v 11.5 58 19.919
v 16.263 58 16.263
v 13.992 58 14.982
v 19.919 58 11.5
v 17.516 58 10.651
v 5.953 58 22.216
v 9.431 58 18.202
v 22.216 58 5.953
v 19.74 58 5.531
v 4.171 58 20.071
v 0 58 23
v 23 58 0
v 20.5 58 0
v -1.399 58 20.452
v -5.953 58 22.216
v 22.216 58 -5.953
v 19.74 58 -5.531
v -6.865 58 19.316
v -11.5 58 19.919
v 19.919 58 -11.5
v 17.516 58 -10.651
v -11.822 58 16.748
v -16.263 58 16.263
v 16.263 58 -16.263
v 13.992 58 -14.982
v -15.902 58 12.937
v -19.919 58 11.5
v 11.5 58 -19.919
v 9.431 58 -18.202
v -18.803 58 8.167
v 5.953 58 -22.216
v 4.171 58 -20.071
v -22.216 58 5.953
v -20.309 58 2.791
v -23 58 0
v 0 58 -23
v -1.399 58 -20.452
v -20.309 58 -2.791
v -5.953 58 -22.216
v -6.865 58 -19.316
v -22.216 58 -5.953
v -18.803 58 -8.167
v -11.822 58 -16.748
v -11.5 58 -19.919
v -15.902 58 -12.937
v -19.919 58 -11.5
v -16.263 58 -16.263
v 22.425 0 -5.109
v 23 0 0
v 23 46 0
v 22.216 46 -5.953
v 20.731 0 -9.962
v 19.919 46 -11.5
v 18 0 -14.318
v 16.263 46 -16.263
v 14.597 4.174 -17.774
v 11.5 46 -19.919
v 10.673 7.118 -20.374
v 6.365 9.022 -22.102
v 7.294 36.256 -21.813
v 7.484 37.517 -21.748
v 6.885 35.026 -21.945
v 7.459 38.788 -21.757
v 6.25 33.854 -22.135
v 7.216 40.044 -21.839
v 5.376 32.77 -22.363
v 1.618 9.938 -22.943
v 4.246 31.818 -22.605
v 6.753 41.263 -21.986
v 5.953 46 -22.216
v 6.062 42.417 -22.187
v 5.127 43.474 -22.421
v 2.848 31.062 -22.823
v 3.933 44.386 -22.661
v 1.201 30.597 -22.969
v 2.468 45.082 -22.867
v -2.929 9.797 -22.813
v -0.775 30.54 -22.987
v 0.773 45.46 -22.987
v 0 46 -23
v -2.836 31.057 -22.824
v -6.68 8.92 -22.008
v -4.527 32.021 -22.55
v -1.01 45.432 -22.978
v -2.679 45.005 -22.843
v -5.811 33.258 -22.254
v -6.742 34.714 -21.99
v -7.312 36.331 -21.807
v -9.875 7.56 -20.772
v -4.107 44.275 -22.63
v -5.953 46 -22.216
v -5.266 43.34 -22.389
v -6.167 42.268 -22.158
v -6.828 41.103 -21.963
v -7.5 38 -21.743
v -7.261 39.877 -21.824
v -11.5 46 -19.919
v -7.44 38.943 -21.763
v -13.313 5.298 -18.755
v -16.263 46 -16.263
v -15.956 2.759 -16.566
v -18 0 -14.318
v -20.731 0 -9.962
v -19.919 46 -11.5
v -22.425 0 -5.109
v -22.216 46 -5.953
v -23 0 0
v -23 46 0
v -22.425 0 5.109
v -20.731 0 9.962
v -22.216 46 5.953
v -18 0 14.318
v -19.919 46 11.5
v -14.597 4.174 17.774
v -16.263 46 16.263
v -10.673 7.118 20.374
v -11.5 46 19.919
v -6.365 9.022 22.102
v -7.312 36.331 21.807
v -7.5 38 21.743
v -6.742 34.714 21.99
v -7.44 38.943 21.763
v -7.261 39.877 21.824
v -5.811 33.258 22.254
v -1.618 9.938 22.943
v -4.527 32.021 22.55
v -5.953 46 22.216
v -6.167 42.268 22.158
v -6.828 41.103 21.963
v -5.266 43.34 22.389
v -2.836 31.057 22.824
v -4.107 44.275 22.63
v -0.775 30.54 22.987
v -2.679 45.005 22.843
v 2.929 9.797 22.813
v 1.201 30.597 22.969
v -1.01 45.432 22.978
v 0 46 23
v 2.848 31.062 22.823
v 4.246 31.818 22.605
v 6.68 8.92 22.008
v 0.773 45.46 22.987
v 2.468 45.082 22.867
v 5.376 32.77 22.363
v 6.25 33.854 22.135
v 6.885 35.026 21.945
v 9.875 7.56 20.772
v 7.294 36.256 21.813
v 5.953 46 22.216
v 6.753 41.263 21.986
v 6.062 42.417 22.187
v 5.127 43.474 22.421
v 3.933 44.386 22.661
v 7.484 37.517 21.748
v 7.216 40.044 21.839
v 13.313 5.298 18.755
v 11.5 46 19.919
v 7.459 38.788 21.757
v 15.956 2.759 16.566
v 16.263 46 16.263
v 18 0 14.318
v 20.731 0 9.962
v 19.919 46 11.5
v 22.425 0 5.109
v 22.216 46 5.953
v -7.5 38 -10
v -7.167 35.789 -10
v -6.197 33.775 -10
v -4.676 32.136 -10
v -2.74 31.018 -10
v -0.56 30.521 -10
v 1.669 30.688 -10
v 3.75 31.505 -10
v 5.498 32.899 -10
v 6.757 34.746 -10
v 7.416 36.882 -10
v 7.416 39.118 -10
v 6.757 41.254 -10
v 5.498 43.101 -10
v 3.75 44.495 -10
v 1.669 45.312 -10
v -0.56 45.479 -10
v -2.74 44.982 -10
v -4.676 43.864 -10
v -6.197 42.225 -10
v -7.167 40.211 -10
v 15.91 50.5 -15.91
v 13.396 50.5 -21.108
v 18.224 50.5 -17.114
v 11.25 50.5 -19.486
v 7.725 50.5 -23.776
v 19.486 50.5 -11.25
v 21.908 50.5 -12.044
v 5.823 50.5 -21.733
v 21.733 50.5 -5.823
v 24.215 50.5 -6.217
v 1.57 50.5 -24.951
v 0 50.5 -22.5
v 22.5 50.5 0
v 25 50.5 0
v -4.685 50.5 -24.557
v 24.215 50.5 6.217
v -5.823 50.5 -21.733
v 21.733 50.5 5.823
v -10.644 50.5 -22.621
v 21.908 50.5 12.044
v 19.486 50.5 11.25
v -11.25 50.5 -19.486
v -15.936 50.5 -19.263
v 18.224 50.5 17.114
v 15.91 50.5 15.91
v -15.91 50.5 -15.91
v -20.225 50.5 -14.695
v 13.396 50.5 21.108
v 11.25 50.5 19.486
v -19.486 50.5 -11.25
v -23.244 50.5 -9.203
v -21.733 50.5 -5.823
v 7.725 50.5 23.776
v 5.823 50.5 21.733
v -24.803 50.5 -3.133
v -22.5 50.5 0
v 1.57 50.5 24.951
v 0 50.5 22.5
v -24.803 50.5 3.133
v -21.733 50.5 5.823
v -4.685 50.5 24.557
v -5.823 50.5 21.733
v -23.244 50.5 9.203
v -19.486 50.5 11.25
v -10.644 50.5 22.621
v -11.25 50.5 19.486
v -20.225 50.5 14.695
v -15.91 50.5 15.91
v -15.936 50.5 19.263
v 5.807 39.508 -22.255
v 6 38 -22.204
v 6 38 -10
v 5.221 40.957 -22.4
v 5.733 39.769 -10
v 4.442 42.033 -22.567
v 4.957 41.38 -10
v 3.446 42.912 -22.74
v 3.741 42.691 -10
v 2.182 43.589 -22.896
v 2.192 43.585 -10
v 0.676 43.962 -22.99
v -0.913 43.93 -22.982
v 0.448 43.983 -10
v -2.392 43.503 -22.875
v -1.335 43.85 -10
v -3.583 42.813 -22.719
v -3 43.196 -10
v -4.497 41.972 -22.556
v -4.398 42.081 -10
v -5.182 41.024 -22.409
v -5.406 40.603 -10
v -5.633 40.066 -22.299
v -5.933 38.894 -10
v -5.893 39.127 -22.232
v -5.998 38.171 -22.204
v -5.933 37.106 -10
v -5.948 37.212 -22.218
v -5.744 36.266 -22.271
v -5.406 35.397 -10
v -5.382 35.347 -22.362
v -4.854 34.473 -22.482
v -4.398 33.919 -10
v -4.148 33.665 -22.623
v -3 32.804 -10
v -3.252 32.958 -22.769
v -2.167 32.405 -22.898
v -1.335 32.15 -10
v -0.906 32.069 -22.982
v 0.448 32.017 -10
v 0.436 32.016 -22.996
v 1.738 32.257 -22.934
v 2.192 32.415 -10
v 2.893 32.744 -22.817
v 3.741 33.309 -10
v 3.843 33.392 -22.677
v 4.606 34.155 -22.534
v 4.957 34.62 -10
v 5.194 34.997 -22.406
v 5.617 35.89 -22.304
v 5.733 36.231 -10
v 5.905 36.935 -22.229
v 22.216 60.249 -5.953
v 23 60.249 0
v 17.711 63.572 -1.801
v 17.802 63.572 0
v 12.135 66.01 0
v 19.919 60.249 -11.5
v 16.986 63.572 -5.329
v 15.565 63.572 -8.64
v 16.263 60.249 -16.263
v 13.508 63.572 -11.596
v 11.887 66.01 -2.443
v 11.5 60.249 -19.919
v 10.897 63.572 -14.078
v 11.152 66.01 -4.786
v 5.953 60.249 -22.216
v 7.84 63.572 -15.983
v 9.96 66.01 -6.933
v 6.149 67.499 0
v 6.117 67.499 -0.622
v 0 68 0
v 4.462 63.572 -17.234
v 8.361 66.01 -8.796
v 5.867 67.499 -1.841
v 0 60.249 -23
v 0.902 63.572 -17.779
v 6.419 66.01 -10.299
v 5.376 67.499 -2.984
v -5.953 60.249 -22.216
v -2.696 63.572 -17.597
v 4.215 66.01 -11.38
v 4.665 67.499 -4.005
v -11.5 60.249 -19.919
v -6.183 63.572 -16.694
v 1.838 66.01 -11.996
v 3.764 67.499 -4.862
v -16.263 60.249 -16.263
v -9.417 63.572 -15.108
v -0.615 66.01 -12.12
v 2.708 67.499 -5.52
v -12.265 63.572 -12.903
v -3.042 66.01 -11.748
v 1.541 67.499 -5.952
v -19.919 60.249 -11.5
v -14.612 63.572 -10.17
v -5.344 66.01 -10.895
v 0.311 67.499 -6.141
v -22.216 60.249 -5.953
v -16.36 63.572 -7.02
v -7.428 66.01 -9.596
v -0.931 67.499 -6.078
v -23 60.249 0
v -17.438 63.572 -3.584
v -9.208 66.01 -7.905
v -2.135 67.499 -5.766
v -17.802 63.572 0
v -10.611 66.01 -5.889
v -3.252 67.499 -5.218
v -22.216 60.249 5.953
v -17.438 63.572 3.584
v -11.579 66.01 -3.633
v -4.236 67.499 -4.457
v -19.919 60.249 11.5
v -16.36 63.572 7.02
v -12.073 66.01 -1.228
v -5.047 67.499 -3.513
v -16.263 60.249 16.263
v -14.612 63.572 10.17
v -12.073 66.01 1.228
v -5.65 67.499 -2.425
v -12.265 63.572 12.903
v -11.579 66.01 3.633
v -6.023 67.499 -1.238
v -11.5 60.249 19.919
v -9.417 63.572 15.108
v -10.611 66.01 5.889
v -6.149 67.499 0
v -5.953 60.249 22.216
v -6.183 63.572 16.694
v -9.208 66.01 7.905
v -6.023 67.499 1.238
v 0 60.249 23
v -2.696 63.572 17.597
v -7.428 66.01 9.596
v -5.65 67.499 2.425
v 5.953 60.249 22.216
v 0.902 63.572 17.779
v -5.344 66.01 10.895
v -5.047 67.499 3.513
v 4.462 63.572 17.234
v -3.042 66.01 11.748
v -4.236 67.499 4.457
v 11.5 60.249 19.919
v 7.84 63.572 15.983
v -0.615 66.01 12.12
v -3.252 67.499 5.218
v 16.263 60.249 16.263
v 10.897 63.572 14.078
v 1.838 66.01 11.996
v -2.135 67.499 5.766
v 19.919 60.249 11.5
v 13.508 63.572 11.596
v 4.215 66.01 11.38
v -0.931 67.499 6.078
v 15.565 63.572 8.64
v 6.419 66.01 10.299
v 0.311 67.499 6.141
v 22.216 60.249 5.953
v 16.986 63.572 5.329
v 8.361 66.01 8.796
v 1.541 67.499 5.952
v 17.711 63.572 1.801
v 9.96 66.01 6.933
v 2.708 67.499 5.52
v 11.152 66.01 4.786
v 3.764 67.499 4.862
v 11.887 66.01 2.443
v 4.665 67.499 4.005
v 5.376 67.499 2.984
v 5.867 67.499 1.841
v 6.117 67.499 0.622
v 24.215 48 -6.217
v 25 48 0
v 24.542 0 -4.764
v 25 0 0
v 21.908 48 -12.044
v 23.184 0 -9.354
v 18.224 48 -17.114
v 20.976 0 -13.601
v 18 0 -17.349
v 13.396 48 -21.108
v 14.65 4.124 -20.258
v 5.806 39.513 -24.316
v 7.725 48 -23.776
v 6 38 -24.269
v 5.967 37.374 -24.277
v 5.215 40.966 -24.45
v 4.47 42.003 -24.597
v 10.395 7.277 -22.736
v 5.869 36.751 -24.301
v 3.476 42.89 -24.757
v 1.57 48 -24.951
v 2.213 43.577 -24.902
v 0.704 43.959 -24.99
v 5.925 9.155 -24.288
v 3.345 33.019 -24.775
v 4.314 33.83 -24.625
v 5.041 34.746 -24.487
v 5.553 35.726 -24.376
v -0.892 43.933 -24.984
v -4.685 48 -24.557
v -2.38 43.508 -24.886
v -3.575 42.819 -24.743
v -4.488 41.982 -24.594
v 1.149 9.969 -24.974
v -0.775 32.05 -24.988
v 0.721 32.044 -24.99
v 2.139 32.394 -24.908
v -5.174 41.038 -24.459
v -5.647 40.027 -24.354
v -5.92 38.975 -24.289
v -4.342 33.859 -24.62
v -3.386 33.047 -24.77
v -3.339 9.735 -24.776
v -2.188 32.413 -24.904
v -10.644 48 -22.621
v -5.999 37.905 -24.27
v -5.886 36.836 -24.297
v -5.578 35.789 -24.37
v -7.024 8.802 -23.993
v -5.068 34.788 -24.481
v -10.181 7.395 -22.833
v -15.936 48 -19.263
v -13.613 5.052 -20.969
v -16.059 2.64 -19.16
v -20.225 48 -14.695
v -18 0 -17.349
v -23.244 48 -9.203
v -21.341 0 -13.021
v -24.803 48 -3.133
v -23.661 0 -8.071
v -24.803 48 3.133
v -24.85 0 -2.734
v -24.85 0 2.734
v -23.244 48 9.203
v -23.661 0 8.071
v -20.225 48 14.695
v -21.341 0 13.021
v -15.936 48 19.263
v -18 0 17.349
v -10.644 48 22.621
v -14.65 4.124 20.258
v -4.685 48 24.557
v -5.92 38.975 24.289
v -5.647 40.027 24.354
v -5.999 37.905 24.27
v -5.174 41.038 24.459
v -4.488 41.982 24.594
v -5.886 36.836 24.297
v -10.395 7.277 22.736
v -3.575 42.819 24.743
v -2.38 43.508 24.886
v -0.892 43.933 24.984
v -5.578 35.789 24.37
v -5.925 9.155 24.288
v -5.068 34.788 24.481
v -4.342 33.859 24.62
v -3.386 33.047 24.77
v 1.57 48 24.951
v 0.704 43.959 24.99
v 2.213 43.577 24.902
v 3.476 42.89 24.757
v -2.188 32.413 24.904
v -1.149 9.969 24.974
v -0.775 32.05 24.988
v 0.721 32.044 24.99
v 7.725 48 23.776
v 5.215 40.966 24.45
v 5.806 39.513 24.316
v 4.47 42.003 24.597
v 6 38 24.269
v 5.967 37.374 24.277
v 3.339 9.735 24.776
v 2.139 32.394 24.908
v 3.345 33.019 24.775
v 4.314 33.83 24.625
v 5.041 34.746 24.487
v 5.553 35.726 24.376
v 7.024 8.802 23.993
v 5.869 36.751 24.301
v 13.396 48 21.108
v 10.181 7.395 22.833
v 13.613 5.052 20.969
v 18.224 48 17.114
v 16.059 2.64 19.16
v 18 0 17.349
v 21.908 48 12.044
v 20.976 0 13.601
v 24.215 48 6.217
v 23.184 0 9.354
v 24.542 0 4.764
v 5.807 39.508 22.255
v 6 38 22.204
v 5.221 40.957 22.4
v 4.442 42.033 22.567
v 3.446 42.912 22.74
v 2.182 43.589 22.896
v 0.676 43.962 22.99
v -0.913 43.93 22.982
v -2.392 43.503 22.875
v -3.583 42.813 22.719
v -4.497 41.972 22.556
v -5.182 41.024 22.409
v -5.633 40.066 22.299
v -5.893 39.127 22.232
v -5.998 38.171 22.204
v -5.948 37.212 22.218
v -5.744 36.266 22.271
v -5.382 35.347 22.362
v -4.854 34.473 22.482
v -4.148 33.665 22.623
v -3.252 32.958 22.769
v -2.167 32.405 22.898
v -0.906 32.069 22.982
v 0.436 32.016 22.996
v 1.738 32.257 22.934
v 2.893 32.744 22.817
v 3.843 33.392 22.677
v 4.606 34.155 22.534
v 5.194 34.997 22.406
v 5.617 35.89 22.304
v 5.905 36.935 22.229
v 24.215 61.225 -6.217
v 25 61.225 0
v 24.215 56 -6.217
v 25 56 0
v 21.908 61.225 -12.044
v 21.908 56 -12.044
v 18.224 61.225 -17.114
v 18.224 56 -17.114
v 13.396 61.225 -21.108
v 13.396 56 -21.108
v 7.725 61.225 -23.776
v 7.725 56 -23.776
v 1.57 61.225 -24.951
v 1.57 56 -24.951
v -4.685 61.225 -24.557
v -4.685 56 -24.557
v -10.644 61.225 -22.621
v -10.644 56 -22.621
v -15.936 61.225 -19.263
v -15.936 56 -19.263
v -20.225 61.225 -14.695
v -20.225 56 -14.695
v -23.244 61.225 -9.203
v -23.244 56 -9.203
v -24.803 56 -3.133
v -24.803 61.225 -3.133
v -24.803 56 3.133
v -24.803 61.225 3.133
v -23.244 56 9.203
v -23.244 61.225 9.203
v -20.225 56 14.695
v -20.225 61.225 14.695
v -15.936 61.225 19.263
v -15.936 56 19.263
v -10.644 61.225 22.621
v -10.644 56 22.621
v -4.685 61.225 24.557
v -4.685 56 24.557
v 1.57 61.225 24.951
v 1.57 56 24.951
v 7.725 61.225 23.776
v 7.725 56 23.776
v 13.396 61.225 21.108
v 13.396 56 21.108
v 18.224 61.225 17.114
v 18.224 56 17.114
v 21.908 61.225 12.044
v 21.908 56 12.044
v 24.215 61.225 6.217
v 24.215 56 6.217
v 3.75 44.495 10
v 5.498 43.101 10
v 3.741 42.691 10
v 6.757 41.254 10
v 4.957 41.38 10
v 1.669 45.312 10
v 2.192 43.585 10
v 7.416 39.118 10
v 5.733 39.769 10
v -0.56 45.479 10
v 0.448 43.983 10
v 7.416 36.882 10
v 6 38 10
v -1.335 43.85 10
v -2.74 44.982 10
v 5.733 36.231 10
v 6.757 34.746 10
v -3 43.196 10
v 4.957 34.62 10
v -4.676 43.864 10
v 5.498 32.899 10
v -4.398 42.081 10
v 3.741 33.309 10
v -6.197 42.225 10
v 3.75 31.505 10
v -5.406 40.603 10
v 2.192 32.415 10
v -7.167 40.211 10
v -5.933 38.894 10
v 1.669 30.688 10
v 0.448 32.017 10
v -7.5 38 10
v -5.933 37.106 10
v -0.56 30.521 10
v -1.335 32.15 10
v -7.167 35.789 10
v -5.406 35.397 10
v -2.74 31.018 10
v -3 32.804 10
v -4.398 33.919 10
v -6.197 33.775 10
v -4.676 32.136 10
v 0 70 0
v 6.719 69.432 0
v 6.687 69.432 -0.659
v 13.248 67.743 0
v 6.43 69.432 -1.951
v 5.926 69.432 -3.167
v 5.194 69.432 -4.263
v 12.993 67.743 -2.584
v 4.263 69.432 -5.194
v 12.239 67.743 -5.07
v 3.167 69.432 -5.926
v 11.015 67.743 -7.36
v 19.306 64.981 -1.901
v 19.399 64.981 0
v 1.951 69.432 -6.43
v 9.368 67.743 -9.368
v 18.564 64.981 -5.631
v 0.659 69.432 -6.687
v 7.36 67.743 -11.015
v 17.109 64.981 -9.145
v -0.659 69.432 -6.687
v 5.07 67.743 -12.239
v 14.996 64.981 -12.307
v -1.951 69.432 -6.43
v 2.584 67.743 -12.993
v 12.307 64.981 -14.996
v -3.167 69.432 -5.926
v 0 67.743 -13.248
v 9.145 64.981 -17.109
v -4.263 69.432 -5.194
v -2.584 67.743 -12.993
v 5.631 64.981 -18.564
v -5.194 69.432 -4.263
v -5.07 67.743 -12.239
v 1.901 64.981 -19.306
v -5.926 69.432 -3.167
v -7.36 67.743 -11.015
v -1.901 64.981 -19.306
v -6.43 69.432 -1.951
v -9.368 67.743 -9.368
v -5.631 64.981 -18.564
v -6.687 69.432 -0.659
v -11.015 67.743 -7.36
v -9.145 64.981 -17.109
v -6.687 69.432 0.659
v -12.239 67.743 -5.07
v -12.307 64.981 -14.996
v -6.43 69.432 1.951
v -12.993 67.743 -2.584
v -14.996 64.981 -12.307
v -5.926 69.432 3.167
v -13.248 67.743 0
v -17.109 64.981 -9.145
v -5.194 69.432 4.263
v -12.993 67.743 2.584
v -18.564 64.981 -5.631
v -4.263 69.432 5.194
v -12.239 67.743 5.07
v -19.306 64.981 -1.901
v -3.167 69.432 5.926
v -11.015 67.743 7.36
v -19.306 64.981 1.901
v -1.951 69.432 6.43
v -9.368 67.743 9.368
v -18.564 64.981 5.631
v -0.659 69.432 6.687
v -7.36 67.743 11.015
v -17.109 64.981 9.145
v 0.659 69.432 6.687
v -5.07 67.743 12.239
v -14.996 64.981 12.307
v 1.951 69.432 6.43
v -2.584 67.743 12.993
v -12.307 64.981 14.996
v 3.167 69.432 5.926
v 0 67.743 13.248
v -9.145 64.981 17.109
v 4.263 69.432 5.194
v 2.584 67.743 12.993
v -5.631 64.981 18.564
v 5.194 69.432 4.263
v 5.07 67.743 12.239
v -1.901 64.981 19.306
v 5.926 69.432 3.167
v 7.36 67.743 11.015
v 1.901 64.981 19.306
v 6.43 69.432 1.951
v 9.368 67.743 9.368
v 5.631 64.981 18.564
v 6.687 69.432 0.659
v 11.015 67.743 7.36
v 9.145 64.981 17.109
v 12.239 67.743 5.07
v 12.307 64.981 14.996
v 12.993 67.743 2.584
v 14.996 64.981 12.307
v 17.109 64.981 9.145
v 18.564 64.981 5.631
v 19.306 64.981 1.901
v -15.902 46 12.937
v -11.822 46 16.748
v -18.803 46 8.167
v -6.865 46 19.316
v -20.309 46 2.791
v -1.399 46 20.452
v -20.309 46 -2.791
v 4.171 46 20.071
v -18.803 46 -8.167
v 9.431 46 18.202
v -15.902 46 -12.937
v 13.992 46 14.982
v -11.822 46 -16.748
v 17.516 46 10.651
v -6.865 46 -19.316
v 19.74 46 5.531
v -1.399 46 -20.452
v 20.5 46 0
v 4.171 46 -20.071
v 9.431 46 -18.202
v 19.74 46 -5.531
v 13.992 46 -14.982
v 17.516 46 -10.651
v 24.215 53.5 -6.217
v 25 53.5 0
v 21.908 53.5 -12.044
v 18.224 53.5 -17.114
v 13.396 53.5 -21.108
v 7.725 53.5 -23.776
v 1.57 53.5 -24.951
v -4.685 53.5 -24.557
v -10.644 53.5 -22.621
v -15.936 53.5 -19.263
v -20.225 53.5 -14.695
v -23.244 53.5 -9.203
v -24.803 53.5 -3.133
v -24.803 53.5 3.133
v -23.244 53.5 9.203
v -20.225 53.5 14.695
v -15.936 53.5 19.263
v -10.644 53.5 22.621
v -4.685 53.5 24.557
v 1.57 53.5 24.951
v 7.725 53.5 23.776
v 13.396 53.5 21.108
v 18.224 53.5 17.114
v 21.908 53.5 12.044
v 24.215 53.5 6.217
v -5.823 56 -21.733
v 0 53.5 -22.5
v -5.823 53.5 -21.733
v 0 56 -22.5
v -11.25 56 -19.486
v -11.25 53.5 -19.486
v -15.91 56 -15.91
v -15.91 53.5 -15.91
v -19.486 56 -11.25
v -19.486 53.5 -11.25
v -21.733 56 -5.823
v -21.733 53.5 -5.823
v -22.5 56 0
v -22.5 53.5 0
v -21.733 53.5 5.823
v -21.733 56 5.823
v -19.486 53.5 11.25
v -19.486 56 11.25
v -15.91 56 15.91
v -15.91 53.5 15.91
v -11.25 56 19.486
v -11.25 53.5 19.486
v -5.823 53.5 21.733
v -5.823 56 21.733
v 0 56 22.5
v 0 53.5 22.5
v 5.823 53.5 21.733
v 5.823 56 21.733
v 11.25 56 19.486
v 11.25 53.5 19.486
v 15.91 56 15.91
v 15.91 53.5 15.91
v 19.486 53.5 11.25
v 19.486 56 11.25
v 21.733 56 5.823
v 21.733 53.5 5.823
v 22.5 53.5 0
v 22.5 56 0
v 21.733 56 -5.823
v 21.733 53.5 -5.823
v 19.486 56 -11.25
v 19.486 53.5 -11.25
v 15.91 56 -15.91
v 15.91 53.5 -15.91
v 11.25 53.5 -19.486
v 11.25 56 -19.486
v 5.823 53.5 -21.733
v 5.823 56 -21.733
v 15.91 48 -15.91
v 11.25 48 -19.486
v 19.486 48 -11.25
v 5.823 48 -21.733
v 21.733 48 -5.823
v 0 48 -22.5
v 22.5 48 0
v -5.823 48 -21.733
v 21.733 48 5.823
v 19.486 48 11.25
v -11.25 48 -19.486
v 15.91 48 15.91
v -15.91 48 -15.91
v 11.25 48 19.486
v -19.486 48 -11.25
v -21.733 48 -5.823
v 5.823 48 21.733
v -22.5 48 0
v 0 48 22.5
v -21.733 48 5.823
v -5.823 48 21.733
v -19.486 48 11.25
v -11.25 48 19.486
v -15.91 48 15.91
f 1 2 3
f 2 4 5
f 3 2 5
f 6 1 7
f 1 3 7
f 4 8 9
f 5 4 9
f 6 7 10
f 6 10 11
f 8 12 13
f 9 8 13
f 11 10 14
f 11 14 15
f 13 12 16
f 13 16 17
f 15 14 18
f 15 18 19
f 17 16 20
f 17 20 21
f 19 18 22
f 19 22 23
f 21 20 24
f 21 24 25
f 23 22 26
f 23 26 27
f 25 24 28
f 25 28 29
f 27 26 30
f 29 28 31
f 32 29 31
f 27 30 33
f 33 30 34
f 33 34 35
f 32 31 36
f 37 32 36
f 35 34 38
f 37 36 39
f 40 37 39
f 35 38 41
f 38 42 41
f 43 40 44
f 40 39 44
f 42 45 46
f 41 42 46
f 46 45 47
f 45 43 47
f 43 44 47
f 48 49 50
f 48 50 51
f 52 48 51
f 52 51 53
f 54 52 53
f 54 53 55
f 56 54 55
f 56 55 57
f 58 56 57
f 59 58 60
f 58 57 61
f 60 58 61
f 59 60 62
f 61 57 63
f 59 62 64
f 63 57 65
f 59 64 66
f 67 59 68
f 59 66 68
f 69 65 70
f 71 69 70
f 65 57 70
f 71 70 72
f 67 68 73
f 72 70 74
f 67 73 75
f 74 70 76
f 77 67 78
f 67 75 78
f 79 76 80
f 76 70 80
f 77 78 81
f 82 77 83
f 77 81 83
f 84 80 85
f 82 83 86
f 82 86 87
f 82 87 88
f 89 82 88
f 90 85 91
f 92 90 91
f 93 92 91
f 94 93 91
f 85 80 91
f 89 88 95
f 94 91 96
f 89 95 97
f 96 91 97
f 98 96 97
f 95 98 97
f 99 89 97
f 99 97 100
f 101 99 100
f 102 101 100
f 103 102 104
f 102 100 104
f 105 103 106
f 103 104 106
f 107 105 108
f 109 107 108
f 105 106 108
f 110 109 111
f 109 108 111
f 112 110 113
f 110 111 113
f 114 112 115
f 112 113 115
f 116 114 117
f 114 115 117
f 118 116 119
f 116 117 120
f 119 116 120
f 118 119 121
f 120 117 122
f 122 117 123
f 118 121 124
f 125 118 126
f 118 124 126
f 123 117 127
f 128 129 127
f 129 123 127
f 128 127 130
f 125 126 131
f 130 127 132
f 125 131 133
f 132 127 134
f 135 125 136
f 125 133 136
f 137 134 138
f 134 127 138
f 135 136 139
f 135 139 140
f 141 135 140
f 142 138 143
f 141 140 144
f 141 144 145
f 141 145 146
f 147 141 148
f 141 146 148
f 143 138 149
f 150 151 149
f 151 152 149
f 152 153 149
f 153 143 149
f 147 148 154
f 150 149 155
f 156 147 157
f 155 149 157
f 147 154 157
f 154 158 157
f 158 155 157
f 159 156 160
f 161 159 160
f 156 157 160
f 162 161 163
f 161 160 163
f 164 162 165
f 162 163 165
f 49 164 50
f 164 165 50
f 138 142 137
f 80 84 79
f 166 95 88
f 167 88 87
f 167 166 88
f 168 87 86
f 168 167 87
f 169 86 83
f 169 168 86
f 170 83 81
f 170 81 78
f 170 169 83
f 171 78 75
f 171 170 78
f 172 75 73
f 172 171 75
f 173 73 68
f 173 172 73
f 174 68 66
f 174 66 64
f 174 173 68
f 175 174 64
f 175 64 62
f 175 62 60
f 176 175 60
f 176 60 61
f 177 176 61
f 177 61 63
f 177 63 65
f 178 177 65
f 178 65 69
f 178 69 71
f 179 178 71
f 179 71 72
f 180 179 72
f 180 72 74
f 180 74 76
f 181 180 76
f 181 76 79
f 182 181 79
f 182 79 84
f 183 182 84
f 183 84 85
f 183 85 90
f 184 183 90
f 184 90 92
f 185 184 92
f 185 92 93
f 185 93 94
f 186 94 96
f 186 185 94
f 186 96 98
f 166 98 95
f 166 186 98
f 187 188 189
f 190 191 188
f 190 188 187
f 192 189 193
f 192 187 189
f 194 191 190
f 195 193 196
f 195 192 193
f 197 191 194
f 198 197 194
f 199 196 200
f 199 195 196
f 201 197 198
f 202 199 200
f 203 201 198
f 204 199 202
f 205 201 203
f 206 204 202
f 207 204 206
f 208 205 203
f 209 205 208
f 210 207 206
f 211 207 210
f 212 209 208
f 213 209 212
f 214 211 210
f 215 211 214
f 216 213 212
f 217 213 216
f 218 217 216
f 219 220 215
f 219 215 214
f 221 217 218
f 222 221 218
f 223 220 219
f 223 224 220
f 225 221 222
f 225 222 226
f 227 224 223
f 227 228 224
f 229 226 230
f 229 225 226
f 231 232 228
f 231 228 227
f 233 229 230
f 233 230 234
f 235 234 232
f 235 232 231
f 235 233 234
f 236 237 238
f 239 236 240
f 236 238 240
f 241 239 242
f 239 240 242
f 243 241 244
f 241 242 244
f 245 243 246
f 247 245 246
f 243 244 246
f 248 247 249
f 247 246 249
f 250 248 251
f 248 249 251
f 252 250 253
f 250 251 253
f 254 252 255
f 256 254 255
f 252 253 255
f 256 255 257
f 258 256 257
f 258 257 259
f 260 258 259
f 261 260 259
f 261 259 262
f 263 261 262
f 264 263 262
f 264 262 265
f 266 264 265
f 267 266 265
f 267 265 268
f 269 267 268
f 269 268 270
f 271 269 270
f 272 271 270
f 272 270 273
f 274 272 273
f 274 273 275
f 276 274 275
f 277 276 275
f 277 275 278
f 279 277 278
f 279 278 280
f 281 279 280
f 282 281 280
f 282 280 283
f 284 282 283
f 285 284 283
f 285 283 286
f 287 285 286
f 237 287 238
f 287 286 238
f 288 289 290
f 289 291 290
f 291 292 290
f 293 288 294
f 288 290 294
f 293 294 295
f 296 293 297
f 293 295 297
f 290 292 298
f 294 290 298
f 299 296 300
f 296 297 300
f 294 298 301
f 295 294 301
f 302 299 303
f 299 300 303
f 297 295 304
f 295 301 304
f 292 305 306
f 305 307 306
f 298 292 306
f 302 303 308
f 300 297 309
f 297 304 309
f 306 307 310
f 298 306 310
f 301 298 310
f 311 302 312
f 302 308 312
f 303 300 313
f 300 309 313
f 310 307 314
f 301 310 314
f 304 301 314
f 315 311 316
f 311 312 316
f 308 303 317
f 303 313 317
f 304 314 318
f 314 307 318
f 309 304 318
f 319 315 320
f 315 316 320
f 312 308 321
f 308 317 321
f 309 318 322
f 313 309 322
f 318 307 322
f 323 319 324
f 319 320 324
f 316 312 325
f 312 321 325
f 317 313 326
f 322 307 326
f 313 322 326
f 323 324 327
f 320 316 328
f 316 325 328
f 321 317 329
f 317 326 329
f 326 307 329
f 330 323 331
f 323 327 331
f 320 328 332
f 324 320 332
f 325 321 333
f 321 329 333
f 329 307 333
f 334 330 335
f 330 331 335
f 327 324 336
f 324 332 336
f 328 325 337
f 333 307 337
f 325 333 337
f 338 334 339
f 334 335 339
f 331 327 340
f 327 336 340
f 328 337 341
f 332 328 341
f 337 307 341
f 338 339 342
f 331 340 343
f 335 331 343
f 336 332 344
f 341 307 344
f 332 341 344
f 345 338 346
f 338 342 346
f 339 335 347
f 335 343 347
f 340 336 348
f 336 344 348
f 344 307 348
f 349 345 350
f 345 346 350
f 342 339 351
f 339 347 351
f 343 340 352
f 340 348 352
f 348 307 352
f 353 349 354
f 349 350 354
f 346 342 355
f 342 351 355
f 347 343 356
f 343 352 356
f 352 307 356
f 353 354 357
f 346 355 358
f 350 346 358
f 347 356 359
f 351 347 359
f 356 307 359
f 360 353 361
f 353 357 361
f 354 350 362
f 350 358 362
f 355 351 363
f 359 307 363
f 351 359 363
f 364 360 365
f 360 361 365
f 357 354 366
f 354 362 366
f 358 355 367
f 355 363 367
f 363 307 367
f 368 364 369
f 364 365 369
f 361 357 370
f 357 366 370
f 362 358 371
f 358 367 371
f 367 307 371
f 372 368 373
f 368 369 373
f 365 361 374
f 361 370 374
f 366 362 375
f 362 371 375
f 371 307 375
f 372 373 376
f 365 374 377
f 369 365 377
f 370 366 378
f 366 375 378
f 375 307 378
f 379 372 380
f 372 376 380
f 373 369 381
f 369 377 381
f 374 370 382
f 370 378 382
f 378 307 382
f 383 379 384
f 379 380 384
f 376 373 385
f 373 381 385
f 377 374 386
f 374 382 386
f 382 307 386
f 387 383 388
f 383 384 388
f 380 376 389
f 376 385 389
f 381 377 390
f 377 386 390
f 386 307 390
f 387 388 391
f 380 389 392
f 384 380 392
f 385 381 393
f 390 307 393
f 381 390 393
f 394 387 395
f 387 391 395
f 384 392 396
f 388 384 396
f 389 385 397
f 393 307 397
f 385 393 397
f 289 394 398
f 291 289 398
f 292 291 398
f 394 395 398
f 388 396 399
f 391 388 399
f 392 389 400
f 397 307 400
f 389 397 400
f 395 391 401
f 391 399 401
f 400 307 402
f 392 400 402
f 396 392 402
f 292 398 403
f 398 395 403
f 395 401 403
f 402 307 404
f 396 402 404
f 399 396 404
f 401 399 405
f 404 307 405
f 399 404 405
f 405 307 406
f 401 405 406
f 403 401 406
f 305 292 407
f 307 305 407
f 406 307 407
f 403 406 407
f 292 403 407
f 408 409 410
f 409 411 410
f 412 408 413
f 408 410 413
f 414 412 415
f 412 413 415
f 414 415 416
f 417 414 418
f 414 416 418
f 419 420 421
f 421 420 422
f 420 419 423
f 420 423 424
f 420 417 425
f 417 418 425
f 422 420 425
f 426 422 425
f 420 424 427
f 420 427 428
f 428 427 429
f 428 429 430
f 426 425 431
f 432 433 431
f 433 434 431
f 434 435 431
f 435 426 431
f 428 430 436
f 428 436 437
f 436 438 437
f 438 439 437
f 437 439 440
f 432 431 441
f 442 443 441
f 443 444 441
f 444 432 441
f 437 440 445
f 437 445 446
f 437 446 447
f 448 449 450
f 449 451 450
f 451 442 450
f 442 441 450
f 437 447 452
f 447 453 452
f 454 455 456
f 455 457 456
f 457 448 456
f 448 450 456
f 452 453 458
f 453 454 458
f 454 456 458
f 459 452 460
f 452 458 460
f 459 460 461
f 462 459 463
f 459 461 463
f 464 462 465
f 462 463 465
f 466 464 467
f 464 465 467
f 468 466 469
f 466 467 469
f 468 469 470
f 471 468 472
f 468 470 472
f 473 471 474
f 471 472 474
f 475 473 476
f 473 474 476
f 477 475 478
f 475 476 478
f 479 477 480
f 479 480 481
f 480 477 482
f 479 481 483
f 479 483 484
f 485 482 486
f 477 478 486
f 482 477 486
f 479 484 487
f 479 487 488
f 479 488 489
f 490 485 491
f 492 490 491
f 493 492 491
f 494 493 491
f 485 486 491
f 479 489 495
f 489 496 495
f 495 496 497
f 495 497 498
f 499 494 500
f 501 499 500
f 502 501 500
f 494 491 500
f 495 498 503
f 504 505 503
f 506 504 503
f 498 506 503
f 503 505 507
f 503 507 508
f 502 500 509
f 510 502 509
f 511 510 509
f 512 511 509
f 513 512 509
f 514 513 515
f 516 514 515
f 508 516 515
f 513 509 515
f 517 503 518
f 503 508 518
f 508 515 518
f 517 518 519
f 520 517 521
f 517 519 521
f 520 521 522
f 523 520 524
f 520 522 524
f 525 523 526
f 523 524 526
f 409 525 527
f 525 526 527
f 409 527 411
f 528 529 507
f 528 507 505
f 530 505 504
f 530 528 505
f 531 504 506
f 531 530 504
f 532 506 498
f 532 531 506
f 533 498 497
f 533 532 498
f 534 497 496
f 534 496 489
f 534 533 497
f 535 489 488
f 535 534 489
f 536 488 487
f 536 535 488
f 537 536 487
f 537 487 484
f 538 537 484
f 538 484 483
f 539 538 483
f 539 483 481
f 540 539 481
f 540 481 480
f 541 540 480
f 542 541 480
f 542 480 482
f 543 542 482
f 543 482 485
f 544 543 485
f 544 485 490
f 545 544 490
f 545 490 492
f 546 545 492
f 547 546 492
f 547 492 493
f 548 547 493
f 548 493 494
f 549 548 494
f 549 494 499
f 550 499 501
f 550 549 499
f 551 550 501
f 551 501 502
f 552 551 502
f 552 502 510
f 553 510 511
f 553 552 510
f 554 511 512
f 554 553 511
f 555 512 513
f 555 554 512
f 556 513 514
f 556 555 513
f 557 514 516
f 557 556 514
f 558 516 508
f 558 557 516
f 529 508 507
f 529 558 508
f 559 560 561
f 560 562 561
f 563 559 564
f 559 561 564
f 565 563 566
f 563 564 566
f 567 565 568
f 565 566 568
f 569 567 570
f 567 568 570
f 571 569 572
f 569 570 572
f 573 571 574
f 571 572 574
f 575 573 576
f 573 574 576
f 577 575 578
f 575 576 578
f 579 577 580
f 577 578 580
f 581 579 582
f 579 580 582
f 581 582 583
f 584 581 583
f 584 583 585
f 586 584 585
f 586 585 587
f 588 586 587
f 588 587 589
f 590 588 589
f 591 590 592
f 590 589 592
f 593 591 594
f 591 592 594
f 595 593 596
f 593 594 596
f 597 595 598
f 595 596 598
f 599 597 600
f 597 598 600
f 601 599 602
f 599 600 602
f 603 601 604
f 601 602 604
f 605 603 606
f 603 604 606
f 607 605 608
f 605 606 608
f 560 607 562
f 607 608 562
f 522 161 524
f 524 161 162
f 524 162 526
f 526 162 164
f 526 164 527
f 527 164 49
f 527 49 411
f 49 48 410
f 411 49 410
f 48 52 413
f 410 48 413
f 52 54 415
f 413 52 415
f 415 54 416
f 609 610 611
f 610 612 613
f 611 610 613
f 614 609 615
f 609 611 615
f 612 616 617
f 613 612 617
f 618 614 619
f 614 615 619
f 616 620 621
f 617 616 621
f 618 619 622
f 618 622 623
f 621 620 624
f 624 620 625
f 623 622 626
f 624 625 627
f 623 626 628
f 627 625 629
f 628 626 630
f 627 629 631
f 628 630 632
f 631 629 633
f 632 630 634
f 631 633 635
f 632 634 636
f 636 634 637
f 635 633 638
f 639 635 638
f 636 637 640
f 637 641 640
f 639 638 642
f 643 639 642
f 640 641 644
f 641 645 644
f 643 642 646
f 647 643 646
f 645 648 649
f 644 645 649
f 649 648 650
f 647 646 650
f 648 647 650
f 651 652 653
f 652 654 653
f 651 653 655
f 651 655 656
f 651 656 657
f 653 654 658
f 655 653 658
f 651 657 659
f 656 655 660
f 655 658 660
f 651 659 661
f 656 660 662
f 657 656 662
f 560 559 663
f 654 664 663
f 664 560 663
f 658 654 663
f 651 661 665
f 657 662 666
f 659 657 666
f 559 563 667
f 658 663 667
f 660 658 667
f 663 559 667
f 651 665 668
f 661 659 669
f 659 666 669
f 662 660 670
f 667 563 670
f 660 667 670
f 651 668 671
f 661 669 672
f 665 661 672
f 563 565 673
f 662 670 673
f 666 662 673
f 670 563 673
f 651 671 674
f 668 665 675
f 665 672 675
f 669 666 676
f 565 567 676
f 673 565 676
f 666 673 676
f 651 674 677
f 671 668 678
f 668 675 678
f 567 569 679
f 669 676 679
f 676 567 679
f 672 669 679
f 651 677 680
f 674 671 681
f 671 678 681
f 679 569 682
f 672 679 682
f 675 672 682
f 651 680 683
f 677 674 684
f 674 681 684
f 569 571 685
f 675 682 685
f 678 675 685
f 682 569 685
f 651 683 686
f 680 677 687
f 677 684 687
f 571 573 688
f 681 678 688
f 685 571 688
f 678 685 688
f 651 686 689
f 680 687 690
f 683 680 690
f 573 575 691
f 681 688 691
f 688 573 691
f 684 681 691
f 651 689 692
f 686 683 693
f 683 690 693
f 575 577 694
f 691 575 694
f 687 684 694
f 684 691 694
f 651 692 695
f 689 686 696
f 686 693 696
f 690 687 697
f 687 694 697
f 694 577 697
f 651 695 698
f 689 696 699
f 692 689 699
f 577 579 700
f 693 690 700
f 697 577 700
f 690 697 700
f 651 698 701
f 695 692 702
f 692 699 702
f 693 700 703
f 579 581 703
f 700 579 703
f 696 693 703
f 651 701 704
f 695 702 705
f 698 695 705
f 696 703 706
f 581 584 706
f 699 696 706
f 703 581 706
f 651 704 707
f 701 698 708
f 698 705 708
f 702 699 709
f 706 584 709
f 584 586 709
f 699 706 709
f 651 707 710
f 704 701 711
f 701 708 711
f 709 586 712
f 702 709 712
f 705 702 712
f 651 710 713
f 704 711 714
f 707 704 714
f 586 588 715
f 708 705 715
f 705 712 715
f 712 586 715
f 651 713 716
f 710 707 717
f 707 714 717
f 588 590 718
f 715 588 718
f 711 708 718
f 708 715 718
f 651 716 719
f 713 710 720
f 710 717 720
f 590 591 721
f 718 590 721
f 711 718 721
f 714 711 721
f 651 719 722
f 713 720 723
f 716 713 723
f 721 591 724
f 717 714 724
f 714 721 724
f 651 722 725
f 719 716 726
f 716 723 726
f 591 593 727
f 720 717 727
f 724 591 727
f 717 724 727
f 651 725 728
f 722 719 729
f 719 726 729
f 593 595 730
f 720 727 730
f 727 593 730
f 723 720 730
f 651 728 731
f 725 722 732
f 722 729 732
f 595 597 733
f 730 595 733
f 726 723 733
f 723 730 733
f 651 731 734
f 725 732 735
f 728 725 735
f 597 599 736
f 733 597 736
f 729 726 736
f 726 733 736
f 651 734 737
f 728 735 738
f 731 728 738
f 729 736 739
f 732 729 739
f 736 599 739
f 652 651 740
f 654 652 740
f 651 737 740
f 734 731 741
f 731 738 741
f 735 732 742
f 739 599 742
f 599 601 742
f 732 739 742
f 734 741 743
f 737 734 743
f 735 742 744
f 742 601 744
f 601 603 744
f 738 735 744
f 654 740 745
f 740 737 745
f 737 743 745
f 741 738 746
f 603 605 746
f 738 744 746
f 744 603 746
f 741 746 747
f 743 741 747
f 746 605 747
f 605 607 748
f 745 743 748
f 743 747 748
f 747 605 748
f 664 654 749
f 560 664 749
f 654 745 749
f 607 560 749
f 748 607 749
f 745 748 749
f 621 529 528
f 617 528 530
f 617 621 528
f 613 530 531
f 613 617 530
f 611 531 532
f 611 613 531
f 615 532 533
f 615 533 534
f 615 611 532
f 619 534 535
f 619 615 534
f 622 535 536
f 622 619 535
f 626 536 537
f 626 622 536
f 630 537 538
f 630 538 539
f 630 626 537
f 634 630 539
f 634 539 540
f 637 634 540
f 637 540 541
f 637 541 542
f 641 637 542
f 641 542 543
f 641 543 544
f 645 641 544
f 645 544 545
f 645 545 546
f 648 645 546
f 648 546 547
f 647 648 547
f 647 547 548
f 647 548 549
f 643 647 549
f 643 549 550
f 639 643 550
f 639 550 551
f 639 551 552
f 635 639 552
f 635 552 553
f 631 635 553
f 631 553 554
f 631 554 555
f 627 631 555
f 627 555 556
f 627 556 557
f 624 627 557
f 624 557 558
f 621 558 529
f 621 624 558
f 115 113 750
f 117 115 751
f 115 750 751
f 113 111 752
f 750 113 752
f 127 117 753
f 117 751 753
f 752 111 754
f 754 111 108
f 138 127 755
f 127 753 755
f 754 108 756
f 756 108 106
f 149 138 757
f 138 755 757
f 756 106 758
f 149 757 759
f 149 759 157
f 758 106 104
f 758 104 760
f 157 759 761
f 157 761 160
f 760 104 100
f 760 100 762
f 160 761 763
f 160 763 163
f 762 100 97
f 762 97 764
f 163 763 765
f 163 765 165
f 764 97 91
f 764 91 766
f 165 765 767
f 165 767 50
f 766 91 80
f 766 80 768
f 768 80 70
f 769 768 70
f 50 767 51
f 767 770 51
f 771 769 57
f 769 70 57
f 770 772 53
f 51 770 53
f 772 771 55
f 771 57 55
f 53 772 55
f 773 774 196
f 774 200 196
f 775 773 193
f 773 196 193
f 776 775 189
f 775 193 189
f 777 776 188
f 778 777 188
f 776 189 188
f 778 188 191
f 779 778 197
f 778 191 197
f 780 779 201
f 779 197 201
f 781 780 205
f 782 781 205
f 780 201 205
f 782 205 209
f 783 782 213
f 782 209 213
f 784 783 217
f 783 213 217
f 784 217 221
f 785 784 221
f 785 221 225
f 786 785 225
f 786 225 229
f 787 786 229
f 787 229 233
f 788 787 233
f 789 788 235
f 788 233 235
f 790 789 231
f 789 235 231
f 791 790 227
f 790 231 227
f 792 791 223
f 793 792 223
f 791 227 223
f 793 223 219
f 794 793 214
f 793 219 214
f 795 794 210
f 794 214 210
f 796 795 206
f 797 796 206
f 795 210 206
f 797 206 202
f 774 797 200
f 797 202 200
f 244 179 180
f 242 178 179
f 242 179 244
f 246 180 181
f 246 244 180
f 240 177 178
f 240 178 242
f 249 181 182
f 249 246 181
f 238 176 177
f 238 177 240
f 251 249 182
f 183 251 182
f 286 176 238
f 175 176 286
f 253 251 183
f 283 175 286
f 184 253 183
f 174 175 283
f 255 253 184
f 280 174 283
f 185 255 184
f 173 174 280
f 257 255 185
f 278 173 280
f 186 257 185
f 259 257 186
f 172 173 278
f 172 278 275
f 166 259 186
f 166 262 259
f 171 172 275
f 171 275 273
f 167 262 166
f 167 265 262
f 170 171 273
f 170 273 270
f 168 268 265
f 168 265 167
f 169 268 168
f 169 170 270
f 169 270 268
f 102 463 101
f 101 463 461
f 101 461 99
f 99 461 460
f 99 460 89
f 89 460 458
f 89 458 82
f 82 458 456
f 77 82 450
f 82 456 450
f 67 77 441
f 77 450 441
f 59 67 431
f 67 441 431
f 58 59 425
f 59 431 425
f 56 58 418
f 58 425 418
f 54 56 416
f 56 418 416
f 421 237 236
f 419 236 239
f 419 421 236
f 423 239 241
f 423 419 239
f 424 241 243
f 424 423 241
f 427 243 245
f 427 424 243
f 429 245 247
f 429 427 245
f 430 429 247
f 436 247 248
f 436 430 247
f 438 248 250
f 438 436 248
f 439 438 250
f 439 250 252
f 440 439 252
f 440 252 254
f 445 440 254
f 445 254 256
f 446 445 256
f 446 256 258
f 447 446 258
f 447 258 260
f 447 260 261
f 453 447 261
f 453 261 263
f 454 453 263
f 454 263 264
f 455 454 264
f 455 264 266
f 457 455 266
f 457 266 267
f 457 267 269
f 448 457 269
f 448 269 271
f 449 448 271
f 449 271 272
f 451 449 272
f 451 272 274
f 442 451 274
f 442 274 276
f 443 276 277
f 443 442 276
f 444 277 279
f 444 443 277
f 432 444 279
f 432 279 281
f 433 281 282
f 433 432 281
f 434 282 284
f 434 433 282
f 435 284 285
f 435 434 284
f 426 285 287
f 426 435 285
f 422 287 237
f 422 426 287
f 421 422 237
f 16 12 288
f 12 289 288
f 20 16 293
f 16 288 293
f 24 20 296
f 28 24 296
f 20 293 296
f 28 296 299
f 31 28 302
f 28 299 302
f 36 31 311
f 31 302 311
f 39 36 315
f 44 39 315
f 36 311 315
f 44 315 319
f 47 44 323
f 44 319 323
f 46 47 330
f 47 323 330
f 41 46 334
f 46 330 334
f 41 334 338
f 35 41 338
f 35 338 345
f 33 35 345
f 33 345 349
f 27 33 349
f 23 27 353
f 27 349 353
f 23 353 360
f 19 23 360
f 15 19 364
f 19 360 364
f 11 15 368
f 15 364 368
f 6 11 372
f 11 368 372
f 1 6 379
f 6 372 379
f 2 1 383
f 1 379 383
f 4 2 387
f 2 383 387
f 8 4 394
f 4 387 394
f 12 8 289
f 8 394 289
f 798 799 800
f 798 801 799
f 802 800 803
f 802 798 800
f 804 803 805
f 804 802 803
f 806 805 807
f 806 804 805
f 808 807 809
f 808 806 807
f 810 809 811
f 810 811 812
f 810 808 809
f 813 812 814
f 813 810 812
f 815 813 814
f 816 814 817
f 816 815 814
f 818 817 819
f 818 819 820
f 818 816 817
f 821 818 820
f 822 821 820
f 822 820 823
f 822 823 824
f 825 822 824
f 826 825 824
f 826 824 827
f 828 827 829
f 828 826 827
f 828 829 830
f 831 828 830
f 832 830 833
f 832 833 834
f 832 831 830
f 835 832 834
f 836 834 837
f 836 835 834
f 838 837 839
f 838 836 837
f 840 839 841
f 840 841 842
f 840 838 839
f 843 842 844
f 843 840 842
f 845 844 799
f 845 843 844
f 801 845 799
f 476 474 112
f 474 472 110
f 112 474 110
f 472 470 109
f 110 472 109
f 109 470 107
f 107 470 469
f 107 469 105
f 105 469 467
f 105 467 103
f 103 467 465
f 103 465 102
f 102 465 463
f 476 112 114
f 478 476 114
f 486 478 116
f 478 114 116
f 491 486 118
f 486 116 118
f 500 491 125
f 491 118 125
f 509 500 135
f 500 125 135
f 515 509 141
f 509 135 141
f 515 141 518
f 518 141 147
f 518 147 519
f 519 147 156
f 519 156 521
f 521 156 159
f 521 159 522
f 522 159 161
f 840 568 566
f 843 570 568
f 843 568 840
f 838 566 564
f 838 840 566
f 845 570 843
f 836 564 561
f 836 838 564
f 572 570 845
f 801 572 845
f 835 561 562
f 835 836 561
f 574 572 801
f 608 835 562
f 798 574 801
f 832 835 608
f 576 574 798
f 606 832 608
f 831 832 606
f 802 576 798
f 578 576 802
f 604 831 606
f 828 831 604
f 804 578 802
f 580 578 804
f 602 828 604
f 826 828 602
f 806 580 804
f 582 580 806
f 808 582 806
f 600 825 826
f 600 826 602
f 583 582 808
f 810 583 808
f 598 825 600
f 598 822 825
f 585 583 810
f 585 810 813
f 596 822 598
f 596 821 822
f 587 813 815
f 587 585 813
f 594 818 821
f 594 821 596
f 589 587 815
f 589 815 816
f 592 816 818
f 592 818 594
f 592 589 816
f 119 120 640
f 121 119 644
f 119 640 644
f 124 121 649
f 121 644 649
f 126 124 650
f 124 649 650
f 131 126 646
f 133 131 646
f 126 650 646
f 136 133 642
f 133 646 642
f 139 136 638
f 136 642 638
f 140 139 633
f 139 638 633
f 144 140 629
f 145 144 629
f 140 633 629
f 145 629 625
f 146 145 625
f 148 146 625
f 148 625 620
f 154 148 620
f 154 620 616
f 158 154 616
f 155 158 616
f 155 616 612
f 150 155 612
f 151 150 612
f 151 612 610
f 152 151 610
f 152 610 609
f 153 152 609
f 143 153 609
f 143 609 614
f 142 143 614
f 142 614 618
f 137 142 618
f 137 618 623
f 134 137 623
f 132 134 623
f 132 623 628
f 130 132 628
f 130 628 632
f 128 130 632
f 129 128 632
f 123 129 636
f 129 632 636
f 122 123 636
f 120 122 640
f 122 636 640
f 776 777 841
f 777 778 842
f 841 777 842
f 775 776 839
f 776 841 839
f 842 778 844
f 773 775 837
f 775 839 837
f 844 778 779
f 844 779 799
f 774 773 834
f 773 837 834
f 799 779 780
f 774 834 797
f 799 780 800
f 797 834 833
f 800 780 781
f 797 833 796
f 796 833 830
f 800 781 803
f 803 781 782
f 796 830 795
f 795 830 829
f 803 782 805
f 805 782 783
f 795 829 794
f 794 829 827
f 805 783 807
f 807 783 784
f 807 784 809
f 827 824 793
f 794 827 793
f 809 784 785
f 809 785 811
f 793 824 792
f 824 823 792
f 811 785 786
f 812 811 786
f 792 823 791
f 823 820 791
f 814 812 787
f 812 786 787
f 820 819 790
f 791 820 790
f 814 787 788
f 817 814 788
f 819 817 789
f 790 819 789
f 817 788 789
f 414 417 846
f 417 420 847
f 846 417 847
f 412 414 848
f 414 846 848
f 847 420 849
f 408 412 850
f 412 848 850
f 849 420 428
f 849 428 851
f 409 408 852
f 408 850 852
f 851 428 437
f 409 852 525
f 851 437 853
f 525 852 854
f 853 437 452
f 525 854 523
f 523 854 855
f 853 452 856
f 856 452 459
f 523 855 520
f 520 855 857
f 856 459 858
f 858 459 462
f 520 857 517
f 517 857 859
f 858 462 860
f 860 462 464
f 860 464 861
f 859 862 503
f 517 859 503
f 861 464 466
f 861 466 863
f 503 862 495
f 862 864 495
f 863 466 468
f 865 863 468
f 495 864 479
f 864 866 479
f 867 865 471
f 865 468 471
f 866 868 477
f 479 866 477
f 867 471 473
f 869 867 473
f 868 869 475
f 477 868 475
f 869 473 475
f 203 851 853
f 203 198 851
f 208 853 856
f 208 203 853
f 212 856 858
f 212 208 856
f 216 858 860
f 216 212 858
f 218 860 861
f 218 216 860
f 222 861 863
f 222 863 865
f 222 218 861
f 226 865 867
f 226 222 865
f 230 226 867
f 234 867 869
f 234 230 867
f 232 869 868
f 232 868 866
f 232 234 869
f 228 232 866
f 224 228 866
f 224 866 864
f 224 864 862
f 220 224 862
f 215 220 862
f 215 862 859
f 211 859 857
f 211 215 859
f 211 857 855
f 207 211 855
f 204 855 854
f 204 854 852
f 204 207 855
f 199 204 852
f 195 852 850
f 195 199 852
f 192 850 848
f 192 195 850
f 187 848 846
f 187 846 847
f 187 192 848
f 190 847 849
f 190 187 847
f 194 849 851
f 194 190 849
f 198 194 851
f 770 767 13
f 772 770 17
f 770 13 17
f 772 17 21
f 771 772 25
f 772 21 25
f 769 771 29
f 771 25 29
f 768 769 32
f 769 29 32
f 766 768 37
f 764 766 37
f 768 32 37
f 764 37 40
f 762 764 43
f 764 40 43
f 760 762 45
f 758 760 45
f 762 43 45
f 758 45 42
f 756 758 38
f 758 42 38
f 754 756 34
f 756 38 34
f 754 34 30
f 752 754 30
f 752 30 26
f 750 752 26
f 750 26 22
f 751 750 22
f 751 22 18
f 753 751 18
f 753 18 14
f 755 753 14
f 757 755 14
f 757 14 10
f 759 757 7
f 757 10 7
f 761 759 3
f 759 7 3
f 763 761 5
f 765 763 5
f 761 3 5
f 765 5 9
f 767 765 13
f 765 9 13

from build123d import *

# Parameters (mm, degrees)
SKETCH2_W                = 2.5
SKETCH2_H                = 2.5
LPATTERN2_COUNT          = 2
LPATTERN2_PITCH          = 5.5
CUT_EXTRUDE1_DEPTH       = 79.421935707
CUT_EXTRUDE1_DEPTH_BACK  = 79.421935707
CUT_EXTRUDE2_DEPTH       = 79.421935771
CUT_EXTRUDE2_DEPTH_BACK  = 79.421935771
SKETCH4_R                = 6
BOSS_EXTRUDE4_REACH      = 90.422
BOSS_EXTRUDE4_END_RADIUS = 23
BOSS_EXTRUDE4_START      = 10
SKETCH5_R                = 7.5
SKETCH5_R_2              = 6


# Read off the part's stored shape, not the designer's step: Shell1
with BuildPart() as part:
    # Sketch1 → Revolve1 (revolve)
    with BuildSketch(Plane.XY):
        with BuildLine():
            Line((0, 0), (0, 70))
            ThreePointArc((0, 70), (13.247648854, 67.742546282), (25, 61.224989992))
            Line((25, 61.224989992), (25, 0))
            Line((25, 0), (0, 0))
        make_face()
    revolve(axis=Axis((0, 0, 0), (0, 1, 0)))

    # Sketch2 → Cut-Revolve2 (revolve, cut)
    with BuildSketch(Plane.XY, mode=Mode.PRIVATE) as cut_revolve2_sk:
        with Locations((23.75, 49.25)):
            Rectangle(SKETCH2_W, SKETCH2_H)
    cut_revolve2 = revolve(cut_revolve2_sk.sketch.rotate(Axis((0, 79.863110142, 0), (0, 1, 0)), 90), axis=Axis((0, 79.863110142, 0), (0, 1, 0)), mode=Mode.SUBTRACT)

    # LPattern2: Cut-Revolve2 ×2
    with Locations(*[(0, i * LPATTERN2_PITCH, 0) for i in range(1, LPATTERN2_COUNT)]):
        add(cut_revolve2, mode=Mode.SUBTRACT)

    # Shell1 outline → Shell1 (revolve, cut)
    with BuildSketch(Plane.XY):
        with BuildLine():
            Line((0, 0), (23, 0))
            Line((23, 0), (23, 46))
            Line((23, 46), (20.5, 46))
            Line((20.5, 46), (20.5, 58))
            Line((20.5, 58), (23, 58))
            Line((23, 58), (23.00000001, 60.248966917))
            ThreePointArc((23.00000001, 60.248966917), (12.135469854, 66.010142619), (0, 68))
            Line((0, 68), (0, 0))
        make_face()
    revolve(axis=Axis((0, 0, 0), (0, 1, 0)), mode=Mode.SUBTRACT)

    # Sketch3 → Cut-Extrude1 (cut, two sides: drawn at the far end of the back side and taken through both)
    with BuildSketch(Plane.XY.offset(-CUT_EXTRUDE1_DEPTH_BACK)):
        with BuildLine():
            Line((-110.085446515, -147.994467613), (-18, 0))
            ThreePointArc((-18, 0), (0, 10), (18, 0))
            Line((18, 0), (110.085446515, -147.994467613))
            Line((110.085446515, -147.994467613), (110.085446515, -496.603657989))
            Line((110.085446515, -496.603657989), (-110.085446515, -496.603657989))
            Line((-110.085446515, -496.603657989), (-110.085446515, -147.994467613))
        make_face()
    extrude(amount=CUT_EXTRUDE1_DEPTH + CUT_EXTRUDE1_DEPTH_BACK, mode=Mode.SUBTRACT)

    # Sketch4 → Cut-Extrude2 (cut, two sides: drawn at the far end of the back side and taken through both)
    with BuildSketch(Plane.XY.offset(-CUT_EXTRUDE2_DEPTH_BACK)):
        with Locations((0, 38)):
            Circle(SKETCH4_R)
    extrude(amount=CUT_EXTRUDE2_DEPTH + CUT_EXTRUDE2_DEPTH_BACK, mode=Mode.SUBTRACT)

    # Boss-Extrude4: up to this cylinder (the profile starts inside it)
    boss_extrude4_end = Plane(origin=(0, 38, 0), z_dir=(0, -1, 0)) * Cylinder(BOSS_EXTRUDE4_END_RADIUS, 227.844, mode=Mode.PRIVATE)
    # Sketch5 → Boss-Extrude4 (add, up to the surface)
    with BuildSketch(Plane.XY.offset(BOSS_EXTRUDE4_START), mode=Mode.PRIVATE) as boss_extrude4_sk1:
        with Locations(Location((0, 38, 0), (0, 0, 180))):
            Circle(SKETCH5_R)
        with Locations((0, 38)):
            Circle(SKETCH5_R_2, mode=Mode.SUBTRACT)
    boss_extrude4_tool1 = extrude(boss_extrude4_sk1.sketch, amount=BOSS_EXTRUDE4_REACH, mode=Mode.PRIVATE) & boss_extrude4_end
    boss_extrude4 = boss_extrude4_tool1.solids().sort_by_distance((7.287868, 38, 10))[0]
    add(boss_extrude4)

    # Mirror1: Boss-Extrude4 across plane
    add(boss_extrude4.mirror(Plane.XY))


solid = part.part
